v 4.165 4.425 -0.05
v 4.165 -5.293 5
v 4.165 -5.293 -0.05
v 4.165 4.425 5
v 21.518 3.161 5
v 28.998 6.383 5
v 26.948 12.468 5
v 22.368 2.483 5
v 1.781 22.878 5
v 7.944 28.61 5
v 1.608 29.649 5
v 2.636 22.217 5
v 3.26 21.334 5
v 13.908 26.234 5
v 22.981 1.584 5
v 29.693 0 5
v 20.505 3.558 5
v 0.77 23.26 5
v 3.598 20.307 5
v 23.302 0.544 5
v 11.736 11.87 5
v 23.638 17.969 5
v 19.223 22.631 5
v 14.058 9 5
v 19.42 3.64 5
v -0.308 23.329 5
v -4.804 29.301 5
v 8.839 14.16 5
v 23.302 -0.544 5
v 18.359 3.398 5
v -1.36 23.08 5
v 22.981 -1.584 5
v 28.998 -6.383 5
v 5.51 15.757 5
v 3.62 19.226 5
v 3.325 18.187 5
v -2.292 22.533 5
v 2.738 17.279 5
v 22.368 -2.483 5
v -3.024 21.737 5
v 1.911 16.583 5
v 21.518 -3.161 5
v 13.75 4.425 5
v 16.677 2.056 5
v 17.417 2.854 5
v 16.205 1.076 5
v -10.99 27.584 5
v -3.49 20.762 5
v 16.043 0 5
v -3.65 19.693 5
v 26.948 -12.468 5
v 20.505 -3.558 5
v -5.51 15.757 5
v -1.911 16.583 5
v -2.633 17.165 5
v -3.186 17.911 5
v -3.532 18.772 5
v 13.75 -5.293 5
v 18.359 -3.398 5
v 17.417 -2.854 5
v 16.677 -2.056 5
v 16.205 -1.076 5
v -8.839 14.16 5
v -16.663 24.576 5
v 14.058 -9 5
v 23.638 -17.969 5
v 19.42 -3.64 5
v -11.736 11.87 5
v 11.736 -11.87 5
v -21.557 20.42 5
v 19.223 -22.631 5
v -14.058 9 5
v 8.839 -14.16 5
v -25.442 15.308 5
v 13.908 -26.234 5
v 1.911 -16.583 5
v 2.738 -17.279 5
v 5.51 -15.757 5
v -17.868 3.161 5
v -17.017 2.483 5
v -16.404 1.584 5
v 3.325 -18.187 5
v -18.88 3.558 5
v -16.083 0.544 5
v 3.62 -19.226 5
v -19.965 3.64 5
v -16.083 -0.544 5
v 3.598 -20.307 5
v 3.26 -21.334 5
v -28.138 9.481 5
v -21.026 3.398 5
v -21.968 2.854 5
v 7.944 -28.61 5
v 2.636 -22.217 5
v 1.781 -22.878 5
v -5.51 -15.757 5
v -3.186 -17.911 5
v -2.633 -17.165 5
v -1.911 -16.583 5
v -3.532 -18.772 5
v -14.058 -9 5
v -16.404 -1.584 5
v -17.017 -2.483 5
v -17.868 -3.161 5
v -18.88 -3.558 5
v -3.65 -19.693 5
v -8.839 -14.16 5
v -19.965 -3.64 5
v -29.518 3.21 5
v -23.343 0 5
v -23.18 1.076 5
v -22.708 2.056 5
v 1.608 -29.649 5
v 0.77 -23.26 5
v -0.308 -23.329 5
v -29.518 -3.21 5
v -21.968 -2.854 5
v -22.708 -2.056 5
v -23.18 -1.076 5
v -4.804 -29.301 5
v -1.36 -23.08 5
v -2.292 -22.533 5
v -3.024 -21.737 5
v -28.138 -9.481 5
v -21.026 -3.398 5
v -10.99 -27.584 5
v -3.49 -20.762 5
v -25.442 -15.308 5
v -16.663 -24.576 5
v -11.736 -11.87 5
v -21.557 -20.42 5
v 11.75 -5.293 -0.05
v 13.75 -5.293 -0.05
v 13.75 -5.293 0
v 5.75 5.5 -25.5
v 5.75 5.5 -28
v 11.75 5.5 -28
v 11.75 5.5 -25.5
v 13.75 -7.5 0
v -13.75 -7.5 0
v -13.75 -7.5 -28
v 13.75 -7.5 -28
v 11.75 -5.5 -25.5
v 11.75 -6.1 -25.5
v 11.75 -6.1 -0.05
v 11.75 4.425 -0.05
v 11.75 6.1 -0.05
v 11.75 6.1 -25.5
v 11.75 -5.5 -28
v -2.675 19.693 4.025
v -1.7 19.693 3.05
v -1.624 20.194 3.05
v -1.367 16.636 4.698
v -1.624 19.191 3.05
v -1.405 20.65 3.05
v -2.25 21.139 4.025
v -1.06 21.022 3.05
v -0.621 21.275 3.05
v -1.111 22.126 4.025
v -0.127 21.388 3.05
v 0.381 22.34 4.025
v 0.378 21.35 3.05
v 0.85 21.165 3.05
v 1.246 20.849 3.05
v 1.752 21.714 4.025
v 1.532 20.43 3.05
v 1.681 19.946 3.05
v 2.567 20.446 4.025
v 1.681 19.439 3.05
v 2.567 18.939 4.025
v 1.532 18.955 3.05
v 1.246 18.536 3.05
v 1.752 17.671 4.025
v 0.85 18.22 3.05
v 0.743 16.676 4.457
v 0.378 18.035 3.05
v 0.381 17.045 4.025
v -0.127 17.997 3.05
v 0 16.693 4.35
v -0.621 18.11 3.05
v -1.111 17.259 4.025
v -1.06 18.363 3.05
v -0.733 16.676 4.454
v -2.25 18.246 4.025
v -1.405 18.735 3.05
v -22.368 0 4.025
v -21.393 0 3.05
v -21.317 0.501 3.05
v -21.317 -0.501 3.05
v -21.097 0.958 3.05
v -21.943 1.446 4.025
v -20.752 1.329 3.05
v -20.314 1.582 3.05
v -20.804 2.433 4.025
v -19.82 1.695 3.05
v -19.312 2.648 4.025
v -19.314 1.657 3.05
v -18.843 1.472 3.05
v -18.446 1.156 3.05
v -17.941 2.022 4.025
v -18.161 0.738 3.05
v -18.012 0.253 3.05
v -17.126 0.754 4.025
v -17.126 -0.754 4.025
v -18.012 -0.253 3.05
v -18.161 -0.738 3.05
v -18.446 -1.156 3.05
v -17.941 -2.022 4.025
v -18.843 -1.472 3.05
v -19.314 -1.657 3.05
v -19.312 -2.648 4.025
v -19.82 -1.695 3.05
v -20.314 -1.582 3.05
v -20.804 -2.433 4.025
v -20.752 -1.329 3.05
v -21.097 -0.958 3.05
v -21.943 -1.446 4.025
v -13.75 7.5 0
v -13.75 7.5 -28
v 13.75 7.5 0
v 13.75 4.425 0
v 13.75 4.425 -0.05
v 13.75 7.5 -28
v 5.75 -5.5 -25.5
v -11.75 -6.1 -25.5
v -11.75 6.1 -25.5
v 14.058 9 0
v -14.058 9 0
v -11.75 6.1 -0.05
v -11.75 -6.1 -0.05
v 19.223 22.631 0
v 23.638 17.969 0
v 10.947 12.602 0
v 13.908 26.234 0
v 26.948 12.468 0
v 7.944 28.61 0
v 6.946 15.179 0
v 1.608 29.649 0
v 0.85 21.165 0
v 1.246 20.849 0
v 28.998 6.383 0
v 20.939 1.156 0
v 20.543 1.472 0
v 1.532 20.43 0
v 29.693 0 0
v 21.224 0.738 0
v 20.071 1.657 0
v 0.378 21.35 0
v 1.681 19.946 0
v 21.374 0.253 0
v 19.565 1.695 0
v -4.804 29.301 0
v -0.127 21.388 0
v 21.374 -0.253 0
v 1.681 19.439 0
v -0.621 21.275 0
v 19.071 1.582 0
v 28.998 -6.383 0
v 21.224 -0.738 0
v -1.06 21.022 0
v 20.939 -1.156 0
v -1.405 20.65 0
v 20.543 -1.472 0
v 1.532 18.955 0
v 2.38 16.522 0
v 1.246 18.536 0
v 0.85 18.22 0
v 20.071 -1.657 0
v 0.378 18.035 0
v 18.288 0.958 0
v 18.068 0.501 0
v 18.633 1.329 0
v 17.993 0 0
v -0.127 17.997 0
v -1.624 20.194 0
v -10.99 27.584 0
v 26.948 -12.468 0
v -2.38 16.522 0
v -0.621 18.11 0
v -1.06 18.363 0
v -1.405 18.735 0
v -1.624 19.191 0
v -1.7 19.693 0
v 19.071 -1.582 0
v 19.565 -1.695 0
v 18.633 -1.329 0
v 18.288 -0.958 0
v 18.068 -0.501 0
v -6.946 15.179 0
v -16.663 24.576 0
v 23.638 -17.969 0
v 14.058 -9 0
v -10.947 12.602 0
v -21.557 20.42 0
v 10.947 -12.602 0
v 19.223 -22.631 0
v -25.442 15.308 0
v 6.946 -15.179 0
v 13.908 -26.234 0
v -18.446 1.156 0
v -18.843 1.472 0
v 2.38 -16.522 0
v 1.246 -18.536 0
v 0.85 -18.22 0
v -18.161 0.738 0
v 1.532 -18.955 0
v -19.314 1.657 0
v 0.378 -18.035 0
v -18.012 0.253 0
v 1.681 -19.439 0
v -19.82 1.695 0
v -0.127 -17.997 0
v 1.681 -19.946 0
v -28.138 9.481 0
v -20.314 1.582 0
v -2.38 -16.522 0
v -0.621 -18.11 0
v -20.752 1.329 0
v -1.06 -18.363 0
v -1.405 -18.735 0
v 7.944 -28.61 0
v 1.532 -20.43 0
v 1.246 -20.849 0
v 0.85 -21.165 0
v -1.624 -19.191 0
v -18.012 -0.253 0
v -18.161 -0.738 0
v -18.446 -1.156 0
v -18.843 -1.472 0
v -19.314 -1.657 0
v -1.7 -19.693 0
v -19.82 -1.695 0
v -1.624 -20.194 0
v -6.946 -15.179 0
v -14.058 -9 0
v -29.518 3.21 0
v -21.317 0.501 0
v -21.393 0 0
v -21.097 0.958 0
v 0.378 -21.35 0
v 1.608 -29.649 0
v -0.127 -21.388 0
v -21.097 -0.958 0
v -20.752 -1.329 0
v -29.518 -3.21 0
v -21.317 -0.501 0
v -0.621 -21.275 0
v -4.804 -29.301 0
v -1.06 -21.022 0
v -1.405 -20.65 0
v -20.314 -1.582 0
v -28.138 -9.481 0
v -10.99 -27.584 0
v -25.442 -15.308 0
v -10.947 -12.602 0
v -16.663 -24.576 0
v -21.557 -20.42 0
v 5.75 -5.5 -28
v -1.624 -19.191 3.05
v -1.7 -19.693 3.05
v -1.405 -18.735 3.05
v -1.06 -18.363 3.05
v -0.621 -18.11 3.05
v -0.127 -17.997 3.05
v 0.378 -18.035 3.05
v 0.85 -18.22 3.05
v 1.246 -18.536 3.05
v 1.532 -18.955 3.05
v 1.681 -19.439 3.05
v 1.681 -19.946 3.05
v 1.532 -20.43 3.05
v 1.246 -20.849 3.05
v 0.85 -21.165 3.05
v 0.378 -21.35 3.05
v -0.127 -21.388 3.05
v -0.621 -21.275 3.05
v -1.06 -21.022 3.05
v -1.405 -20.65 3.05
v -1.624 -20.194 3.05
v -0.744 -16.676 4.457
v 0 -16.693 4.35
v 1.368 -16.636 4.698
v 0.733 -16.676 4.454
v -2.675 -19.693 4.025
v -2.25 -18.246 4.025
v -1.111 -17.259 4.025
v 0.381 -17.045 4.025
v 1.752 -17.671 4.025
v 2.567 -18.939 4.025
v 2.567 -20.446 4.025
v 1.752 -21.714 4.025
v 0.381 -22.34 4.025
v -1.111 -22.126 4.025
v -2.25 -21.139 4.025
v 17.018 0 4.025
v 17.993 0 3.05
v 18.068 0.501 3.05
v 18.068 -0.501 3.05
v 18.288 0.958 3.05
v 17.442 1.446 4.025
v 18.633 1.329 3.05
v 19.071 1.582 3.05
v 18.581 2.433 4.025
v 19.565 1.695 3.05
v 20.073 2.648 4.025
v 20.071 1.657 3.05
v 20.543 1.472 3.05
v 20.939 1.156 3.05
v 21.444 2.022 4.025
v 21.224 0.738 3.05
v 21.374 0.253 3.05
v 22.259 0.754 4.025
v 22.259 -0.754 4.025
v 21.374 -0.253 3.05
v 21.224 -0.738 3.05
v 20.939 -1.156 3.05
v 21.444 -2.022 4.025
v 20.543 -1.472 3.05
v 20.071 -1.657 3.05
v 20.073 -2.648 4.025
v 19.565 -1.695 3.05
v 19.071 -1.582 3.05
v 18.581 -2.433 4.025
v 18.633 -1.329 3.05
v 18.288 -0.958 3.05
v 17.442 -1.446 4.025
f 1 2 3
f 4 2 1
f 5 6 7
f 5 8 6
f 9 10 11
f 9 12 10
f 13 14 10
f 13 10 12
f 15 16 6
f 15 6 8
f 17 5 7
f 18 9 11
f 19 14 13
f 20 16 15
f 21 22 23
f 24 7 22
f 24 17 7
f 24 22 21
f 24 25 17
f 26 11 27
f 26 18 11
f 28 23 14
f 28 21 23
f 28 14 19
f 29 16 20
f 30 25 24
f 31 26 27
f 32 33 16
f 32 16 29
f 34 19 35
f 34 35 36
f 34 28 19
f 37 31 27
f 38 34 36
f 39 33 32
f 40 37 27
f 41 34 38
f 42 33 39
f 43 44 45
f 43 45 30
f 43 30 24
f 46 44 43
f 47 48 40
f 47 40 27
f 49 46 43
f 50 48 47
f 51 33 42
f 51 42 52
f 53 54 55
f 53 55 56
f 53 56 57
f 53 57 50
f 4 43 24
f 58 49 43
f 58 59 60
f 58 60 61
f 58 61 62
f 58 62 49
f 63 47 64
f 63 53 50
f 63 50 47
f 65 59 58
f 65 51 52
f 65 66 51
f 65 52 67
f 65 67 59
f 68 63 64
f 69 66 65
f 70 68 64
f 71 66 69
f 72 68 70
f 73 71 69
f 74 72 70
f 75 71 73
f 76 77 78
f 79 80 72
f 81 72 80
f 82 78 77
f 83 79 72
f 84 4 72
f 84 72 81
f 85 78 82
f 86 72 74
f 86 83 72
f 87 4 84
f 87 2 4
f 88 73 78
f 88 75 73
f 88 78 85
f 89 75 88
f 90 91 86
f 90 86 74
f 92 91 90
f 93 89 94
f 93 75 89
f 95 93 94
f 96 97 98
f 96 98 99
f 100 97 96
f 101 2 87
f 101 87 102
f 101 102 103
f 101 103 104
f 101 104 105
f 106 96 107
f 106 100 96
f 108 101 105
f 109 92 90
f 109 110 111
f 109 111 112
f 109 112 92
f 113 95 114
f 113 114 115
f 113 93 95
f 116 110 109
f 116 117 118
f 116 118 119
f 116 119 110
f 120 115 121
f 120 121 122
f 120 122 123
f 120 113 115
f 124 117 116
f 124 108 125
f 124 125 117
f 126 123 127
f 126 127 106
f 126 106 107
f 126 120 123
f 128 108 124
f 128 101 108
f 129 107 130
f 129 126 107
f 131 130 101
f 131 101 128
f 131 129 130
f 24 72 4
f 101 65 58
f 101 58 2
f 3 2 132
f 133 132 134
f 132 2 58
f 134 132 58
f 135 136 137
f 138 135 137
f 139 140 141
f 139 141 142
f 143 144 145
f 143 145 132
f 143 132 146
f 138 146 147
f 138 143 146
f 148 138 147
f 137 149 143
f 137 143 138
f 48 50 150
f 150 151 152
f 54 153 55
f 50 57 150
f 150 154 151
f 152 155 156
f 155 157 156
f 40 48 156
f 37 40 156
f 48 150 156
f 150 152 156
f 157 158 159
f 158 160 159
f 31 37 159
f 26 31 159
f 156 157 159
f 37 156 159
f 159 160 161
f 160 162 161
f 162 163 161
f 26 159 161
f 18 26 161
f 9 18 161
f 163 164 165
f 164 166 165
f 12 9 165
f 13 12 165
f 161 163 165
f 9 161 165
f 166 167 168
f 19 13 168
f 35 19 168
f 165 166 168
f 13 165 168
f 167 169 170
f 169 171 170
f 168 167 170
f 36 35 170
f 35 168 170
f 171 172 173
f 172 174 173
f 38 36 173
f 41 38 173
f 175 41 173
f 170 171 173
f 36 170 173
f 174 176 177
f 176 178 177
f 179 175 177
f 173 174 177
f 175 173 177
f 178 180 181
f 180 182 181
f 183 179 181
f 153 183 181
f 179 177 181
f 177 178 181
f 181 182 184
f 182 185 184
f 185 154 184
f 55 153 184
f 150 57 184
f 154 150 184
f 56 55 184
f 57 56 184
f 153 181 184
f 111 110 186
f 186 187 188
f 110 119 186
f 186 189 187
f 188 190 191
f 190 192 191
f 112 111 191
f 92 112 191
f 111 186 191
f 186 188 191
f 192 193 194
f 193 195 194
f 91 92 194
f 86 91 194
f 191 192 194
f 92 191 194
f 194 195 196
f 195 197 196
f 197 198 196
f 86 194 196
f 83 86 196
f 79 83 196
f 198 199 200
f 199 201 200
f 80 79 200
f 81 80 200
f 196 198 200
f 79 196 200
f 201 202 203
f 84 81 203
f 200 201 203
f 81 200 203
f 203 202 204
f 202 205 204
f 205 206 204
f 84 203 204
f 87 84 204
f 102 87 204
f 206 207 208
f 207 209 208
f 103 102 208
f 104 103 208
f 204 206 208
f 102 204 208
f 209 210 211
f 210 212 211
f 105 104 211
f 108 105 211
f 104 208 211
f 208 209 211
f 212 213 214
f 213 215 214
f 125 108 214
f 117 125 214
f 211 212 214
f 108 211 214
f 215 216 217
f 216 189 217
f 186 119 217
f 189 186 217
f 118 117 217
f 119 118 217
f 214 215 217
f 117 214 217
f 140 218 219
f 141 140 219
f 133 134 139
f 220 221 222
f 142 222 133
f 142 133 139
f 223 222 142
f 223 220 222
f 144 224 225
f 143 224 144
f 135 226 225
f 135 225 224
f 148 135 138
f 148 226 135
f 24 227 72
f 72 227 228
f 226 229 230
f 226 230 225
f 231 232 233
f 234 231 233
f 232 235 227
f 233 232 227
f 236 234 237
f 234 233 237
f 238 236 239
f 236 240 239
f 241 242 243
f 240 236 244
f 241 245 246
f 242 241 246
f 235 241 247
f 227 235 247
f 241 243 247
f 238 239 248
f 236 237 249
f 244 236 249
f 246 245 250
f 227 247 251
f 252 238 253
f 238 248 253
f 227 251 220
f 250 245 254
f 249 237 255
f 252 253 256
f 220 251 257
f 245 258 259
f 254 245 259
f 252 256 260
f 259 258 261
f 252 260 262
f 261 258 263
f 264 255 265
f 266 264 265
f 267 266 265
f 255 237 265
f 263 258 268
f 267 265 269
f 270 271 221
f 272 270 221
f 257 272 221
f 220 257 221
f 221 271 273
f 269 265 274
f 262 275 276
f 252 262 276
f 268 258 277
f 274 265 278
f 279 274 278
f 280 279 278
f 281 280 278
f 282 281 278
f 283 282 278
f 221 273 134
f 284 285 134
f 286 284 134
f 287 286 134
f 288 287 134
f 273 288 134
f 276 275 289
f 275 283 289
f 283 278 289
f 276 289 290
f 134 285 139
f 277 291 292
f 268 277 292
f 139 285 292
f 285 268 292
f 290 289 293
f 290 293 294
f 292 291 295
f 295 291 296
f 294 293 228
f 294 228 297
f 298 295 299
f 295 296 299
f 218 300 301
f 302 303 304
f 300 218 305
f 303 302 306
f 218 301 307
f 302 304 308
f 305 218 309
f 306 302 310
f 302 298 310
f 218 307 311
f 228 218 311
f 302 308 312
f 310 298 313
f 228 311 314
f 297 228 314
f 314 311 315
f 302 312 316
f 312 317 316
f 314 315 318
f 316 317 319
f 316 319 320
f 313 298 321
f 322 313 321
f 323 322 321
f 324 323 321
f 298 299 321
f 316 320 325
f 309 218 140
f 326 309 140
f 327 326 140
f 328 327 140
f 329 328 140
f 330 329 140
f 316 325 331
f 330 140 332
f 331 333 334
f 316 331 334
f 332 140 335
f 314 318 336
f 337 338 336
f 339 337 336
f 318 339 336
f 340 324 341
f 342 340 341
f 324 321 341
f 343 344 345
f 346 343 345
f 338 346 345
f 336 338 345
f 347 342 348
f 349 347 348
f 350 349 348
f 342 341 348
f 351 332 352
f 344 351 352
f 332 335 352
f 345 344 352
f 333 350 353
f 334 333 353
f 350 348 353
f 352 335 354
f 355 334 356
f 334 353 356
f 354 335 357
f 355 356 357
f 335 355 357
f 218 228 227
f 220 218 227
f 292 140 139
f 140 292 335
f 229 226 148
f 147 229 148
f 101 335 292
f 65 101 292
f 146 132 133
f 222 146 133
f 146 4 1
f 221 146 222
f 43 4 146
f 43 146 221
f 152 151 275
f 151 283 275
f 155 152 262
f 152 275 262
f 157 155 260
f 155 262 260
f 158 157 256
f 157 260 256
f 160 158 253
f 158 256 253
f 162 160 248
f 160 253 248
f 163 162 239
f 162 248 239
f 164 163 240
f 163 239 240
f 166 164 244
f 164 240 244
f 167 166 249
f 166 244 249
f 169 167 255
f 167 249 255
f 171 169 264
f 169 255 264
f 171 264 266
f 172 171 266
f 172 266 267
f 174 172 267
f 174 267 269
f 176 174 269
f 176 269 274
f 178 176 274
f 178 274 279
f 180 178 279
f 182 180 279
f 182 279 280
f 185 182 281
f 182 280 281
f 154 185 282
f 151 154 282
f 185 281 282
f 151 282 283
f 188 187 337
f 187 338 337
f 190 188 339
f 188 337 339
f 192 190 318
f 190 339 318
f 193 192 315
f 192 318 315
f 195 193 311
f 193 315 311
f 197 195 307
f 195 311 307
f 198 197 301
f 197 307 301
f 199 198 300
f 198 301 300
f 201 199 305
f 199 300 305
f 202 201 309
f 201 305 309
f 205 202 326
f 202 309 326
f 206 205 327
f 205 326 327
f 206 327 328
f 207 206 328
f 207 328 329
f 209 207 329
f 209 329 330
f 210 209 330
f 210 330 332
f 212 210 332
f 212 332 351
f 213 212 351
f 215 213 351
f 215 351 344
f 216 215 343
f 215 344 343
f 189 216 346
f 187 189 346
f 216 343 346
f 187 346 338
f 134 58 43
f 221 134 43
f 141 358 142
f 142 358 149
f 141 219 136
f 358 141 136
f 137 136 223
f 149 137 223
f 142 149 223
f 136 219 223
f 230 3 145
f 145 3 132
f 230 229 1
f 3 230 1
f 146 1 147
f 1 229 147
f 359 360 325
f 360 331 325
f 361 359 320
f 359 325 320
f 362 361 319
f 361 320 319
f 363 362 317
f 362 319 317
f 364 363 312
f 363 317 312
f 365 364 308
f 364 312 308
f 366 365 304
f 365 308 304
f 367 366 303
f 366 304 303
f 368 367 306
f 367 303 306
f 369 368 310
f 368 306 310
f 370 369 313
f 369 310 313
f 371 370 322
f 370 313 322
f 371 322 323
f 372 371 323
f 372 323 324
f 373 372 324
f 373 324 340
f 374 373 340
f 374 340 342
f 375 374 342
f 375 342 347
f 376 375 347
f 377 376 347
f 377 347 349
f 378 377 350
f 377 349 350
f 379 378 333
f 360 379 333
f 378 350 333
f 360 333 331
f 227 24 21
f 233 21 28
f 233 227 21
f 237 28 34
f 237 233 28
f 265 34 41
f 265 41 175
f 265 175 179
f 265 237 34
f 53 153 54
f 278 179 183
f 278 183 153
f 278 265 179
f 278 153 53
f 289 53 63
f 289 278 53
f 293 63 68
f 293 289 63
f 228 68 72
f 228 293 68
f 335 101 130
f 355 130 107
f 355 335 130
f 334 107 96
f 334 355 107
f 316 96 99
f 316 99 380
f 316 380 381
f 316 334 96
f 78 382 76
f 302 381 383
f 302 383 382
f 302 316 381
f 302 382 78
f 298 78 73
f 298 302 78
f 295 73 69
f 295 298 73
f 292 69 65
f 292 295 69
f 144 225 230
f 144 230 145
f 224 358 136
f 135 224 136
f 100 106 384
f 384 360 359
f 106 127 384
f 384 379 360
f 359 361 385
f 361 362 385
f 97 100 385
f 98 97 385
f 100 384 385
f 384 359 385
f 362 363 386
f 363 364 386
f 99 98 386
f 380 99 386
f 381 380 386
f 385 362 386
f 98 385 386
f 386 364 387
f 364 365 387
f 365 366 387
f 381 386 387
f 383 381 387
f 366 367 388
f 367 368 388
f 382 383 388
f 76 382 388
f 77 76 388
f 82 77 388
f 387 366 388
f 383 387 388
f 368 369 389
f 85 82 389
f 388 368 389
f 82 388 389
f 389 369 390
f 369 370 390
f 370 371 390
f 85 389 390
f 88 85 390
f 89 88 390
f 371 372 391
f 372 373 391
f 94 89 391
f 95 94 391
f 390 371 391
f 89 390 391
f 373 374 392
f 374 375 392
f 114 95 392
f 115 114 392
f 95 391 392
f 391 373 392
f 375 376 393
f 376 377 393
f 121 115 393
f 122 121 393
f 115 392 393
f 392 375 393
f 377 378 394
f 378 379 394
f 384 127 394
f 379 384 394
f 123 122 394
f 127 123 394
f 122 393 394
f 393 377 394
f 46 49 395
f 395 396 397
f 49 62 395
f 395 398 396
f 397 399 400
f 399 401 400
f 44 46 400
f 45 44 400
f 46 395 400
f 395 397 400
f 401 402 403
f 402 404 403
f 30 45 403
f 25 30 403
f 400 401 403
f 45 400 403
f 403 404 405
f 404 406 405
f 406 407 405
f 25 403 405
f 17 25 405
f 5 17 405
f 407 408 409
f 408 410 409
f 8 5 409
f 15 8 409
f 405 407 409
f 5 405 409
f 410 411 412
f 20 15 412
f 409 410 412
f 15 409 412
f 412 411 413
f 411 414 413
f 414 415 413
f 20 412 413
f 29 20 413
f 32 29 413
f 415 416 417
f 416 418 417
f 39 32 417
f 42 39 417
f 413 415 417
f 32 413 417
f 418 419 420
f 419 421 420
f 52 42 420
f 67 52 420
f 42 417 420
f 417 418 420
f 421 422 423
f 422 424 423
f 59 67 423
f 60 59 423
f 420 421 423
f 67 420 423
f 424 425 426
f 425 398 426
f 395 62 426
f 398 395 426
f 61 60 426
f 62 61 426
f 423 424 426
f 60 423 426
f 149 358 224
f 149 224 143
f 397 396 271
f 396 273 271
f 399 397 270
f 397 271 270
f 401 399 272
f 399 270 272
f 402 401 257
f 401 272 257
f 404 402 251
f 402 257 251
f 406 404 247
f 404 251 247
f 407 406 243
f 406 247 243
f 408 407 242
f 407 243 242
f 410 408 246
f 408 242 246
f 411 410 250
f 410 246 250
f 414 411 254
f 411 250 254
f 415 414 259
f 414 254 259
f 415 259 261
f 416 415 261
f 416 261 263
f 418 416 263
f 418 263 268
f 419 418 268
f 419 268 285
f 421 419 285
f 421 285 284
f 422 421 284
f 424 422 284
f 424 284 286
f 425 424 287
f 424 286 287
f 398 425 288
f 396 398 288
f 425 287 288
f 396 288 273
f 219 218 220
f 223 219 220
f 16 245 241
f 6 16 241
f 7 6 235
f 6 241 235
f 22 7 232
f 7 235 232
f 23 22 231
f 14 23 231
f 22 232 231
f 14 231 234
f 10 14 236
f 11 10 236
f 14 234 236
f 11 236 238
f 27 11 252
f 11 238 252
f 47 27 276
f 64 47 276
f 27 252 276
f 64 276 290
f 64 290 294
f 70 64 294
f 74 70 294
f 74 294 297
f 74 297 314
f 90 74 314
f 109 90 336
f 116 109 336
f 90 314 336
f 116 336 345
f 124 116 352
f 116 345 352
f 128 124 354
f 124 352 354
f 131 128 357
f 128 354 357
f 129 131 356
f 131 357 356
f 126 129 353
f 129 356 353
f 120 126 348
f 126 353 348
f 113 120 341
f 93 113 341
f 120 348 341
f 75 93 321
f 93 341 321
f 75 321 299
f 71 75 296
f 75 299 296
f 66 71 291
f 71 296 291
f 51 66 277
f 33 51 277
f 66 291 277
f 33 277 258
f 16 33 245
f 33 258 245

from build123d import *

# Parameters (mm, degrees)
SKETCH1_R                                       = 29.692527183
SKETCH1_R_2                                     = 22.692527183
SKETCH1_R_3                                     = 19.692527183
SKETCH1_R_4                                     = 16.692527183
BOSS_EXTRUDE1_DEPTH                             = 5
CSK_FOR_M3_FLAT_HEAD_MACHINE_SCREW2_D           = 3.4
CSK_FOR_M3_FLAT_HEAD_MACHINE_SCREW2_DEPTH       = 12
CSK_FOR_M3_FLAT_HEAD_MACHINE_SCREW2_CSINK_D     = 7.3
CSK_FOR_M3_FLAT_HEAD_MACHINE_SCREW2_CSINK_ANGLE = 90
CSK_FOR_M3_FLAT_HEAD_MACHINE_SCREW2_TIP         = 1.021463052
SKETCH9_W                                       = 27.5
SKETCH9_H                                       = 28
BOSS_EXTRUDE2_DEPTH                             = 7.5
SKETCH10_W                                      = 23.5
SKETCH10_H                                      = 25.45
CUT_EXTRUDE1_DEPTH                              = 6.1
SKETCH12_W                                      = 6
SKETCH12_H                                      = 11
CUT_EXTRUDE2_DEPTH                              = 3
CUT_EXTRUDE3_REACH                              = 55.407
SKETCH11_W                                      = 9.585282086
SKETCH11_H                                      = 9.717675131


with BuildPart() as part:
    # Sketch1 → Boss-Extrude1 (new body)
    # profile 1 of 4: a face of its own
    with BuildSketch(Plane(origin=(0, 0, 0), x_dir=(-1, 0, 0), z_dir=(0, 0, 1))):
        with Locations(Location((0, 0, 0), (0, 0, 180))):
            Circle(SKETCH1_R)
        Circle(SKETCH1_R_2, mode=Mode.SUBTRACT)
    # profile 2 of 4: a face of its own
    with BuildSketch(Plane(origin=(0, 0, 0), x_dir=(-1, 0, 0), z_dir=(0, 0, 1))):
        Circle(SKETCH1_R_2)
        Circle(SKETCH1_R_3, mode=Mode.SUBTRACT)
    # profile 3 of 4: a face of its own
    with BuildSketch(Plane(origin=(0, 0, 0), x_dir=(-1, 0, 0), z_dir=(0, 0, 1))):
        Circle(SKETCH1_R_3)
        Circle(SKETCH1_R_4, mode=Mode.SUBTRACT)
    # profile 4 of 4: a face of its own
    with BuildSketch(Plane(origin=(0, 0, 0), x_dir=(-1, 0, 0), z_dir=(0, 0, 1))):
        with BuildLine():
            Line((14.058465911, 9), (-14.058465911, 9))
            ThreePointArc((-14.058465911, 9), (-16.692527183, 0), (-14.058465911, -9))
            Line((-14.058465911, -9), (14.058465911, -9))
            ThreePointArc((14.058465911, -9), (16.020483578, -4.688770595), (16.692527183, 0))
            ThreePointArc((16.692527183, 0), (16.020483578, 4.688770595), (14.058465911, 9))
        make_face()
    extrude(amount=BOSS_EXTRUDE1_DEPTH)

    # CSK for M3 Flat Head Machine Screw2
    with Locations(Plane.XY.offset(5)):
        with Locations((0, 19.692527183), (0, -19.692527183), (19.692527183, 0), (-19.692527183, 0)):
            CounterSinkHole(CSK_FOR_M3_FLAT_HEAD_MACHINE_SCREW2_D / 2, CSK_FOR_M3_FLAT_HEAD_MACHINE_SCREW2_CSINK_D / 2, depth=CSK_FOR_M3_FLAT_HEAD_MACHINE_SCREW2_DEPTH, counter_sink_angle=CSK_FOR_M3_FLAT_HEAD_MACHINE_SCREW2_CSINK_ANGLE)
            with Locations((0, 0, -(CSK_FOR_M3_FLAT_HEAD_MACHINE_SCREW2_DEPTH + CSK_FOR_M3_FLAT_HEAD_MACHINE_SCREW2_TIP / 2))):  # 118° drill point
                Cone(0, CSK_FOR_M3_FLAT_HEAD_MACHINE_SCREW2_D / 2, CSK_FOR_M3_FLAT_HEAD_MACHINE_SCREW2_TIP, mode=Mode.SUBTRACT)

    # Sketch9 → Boss-Extrude2 (add, symmetric)
    with BuildSketch(Plane(origin=(0, 0, 0), x_dir=(1, 0, 0), z_dir=(0, 1, 0))):
        with Locations((0, 14)):
            Rectangle(SKETCH9_W, SKETCH9_H)
    extrude(amount=BOSS_EXTRUDE2_DEPTH, both=True)

    # Sketch10 → Cut-Extrude1 (cut, symmetric)
    with BuildSketch(Plane(origin=(0, 0, 0), x_dir=(1, 0, 0), z_dir=(0, 1, 0))):
        with Locations((0, 12.775)):
            Rectangle(SKETCH10_W, SKETCH10_H)
    extrude(amount=CUT_EXTRUDE1_DEPTH, both=True, mode=Mode.SUBTRACT)

    # Sketch12 → Cut-Extrude2 (cut)
    with BuildSketch(Plane.XY.offset(-28)):
        with Locations((8.75, 0)):
            Rectangle(SKETCH12_W, SKETCH12_H)
    extrude(amount=CUT_EXTRUDE2_DEPTH, mode=Mode.SUBTRACT)

    # Cut-Extrude3: up to this face of the body (flat: up to its plane)
    cut_extrude3_end = Plane(part.part.faces().sort_by_distance((0, 0, -0.05))[0])
    # Sketch11 → Cut-Extrude3 (cut, up to the picked face)
    with BuildSketch(Plane.XY.offset(5), mode=Mode.PRIVATE) as cut_extrude3_sk1:
        with Locations((8.957358957, -0.433824782)):
            Rectangle(SKETCH11_W, SKETCH11_H)
    cut_extrude3_tool1 = split(extrude(cut_extrude3_sk1.sketch, amount=-CUT_EXTRUDE3_REACH, mode=Mode.PRIVATE), bisect_by=cut_extrude3_end, keep=Keep.BOTH, mode=Mode.PRIVATE)
    add(cut_extrude3_tool1.solids().sort_by(Axis((8.957359, -0.433825, 5), (0, 0, -1)))[0], mode=Mode.SUBTRACT)


solid = part.part
